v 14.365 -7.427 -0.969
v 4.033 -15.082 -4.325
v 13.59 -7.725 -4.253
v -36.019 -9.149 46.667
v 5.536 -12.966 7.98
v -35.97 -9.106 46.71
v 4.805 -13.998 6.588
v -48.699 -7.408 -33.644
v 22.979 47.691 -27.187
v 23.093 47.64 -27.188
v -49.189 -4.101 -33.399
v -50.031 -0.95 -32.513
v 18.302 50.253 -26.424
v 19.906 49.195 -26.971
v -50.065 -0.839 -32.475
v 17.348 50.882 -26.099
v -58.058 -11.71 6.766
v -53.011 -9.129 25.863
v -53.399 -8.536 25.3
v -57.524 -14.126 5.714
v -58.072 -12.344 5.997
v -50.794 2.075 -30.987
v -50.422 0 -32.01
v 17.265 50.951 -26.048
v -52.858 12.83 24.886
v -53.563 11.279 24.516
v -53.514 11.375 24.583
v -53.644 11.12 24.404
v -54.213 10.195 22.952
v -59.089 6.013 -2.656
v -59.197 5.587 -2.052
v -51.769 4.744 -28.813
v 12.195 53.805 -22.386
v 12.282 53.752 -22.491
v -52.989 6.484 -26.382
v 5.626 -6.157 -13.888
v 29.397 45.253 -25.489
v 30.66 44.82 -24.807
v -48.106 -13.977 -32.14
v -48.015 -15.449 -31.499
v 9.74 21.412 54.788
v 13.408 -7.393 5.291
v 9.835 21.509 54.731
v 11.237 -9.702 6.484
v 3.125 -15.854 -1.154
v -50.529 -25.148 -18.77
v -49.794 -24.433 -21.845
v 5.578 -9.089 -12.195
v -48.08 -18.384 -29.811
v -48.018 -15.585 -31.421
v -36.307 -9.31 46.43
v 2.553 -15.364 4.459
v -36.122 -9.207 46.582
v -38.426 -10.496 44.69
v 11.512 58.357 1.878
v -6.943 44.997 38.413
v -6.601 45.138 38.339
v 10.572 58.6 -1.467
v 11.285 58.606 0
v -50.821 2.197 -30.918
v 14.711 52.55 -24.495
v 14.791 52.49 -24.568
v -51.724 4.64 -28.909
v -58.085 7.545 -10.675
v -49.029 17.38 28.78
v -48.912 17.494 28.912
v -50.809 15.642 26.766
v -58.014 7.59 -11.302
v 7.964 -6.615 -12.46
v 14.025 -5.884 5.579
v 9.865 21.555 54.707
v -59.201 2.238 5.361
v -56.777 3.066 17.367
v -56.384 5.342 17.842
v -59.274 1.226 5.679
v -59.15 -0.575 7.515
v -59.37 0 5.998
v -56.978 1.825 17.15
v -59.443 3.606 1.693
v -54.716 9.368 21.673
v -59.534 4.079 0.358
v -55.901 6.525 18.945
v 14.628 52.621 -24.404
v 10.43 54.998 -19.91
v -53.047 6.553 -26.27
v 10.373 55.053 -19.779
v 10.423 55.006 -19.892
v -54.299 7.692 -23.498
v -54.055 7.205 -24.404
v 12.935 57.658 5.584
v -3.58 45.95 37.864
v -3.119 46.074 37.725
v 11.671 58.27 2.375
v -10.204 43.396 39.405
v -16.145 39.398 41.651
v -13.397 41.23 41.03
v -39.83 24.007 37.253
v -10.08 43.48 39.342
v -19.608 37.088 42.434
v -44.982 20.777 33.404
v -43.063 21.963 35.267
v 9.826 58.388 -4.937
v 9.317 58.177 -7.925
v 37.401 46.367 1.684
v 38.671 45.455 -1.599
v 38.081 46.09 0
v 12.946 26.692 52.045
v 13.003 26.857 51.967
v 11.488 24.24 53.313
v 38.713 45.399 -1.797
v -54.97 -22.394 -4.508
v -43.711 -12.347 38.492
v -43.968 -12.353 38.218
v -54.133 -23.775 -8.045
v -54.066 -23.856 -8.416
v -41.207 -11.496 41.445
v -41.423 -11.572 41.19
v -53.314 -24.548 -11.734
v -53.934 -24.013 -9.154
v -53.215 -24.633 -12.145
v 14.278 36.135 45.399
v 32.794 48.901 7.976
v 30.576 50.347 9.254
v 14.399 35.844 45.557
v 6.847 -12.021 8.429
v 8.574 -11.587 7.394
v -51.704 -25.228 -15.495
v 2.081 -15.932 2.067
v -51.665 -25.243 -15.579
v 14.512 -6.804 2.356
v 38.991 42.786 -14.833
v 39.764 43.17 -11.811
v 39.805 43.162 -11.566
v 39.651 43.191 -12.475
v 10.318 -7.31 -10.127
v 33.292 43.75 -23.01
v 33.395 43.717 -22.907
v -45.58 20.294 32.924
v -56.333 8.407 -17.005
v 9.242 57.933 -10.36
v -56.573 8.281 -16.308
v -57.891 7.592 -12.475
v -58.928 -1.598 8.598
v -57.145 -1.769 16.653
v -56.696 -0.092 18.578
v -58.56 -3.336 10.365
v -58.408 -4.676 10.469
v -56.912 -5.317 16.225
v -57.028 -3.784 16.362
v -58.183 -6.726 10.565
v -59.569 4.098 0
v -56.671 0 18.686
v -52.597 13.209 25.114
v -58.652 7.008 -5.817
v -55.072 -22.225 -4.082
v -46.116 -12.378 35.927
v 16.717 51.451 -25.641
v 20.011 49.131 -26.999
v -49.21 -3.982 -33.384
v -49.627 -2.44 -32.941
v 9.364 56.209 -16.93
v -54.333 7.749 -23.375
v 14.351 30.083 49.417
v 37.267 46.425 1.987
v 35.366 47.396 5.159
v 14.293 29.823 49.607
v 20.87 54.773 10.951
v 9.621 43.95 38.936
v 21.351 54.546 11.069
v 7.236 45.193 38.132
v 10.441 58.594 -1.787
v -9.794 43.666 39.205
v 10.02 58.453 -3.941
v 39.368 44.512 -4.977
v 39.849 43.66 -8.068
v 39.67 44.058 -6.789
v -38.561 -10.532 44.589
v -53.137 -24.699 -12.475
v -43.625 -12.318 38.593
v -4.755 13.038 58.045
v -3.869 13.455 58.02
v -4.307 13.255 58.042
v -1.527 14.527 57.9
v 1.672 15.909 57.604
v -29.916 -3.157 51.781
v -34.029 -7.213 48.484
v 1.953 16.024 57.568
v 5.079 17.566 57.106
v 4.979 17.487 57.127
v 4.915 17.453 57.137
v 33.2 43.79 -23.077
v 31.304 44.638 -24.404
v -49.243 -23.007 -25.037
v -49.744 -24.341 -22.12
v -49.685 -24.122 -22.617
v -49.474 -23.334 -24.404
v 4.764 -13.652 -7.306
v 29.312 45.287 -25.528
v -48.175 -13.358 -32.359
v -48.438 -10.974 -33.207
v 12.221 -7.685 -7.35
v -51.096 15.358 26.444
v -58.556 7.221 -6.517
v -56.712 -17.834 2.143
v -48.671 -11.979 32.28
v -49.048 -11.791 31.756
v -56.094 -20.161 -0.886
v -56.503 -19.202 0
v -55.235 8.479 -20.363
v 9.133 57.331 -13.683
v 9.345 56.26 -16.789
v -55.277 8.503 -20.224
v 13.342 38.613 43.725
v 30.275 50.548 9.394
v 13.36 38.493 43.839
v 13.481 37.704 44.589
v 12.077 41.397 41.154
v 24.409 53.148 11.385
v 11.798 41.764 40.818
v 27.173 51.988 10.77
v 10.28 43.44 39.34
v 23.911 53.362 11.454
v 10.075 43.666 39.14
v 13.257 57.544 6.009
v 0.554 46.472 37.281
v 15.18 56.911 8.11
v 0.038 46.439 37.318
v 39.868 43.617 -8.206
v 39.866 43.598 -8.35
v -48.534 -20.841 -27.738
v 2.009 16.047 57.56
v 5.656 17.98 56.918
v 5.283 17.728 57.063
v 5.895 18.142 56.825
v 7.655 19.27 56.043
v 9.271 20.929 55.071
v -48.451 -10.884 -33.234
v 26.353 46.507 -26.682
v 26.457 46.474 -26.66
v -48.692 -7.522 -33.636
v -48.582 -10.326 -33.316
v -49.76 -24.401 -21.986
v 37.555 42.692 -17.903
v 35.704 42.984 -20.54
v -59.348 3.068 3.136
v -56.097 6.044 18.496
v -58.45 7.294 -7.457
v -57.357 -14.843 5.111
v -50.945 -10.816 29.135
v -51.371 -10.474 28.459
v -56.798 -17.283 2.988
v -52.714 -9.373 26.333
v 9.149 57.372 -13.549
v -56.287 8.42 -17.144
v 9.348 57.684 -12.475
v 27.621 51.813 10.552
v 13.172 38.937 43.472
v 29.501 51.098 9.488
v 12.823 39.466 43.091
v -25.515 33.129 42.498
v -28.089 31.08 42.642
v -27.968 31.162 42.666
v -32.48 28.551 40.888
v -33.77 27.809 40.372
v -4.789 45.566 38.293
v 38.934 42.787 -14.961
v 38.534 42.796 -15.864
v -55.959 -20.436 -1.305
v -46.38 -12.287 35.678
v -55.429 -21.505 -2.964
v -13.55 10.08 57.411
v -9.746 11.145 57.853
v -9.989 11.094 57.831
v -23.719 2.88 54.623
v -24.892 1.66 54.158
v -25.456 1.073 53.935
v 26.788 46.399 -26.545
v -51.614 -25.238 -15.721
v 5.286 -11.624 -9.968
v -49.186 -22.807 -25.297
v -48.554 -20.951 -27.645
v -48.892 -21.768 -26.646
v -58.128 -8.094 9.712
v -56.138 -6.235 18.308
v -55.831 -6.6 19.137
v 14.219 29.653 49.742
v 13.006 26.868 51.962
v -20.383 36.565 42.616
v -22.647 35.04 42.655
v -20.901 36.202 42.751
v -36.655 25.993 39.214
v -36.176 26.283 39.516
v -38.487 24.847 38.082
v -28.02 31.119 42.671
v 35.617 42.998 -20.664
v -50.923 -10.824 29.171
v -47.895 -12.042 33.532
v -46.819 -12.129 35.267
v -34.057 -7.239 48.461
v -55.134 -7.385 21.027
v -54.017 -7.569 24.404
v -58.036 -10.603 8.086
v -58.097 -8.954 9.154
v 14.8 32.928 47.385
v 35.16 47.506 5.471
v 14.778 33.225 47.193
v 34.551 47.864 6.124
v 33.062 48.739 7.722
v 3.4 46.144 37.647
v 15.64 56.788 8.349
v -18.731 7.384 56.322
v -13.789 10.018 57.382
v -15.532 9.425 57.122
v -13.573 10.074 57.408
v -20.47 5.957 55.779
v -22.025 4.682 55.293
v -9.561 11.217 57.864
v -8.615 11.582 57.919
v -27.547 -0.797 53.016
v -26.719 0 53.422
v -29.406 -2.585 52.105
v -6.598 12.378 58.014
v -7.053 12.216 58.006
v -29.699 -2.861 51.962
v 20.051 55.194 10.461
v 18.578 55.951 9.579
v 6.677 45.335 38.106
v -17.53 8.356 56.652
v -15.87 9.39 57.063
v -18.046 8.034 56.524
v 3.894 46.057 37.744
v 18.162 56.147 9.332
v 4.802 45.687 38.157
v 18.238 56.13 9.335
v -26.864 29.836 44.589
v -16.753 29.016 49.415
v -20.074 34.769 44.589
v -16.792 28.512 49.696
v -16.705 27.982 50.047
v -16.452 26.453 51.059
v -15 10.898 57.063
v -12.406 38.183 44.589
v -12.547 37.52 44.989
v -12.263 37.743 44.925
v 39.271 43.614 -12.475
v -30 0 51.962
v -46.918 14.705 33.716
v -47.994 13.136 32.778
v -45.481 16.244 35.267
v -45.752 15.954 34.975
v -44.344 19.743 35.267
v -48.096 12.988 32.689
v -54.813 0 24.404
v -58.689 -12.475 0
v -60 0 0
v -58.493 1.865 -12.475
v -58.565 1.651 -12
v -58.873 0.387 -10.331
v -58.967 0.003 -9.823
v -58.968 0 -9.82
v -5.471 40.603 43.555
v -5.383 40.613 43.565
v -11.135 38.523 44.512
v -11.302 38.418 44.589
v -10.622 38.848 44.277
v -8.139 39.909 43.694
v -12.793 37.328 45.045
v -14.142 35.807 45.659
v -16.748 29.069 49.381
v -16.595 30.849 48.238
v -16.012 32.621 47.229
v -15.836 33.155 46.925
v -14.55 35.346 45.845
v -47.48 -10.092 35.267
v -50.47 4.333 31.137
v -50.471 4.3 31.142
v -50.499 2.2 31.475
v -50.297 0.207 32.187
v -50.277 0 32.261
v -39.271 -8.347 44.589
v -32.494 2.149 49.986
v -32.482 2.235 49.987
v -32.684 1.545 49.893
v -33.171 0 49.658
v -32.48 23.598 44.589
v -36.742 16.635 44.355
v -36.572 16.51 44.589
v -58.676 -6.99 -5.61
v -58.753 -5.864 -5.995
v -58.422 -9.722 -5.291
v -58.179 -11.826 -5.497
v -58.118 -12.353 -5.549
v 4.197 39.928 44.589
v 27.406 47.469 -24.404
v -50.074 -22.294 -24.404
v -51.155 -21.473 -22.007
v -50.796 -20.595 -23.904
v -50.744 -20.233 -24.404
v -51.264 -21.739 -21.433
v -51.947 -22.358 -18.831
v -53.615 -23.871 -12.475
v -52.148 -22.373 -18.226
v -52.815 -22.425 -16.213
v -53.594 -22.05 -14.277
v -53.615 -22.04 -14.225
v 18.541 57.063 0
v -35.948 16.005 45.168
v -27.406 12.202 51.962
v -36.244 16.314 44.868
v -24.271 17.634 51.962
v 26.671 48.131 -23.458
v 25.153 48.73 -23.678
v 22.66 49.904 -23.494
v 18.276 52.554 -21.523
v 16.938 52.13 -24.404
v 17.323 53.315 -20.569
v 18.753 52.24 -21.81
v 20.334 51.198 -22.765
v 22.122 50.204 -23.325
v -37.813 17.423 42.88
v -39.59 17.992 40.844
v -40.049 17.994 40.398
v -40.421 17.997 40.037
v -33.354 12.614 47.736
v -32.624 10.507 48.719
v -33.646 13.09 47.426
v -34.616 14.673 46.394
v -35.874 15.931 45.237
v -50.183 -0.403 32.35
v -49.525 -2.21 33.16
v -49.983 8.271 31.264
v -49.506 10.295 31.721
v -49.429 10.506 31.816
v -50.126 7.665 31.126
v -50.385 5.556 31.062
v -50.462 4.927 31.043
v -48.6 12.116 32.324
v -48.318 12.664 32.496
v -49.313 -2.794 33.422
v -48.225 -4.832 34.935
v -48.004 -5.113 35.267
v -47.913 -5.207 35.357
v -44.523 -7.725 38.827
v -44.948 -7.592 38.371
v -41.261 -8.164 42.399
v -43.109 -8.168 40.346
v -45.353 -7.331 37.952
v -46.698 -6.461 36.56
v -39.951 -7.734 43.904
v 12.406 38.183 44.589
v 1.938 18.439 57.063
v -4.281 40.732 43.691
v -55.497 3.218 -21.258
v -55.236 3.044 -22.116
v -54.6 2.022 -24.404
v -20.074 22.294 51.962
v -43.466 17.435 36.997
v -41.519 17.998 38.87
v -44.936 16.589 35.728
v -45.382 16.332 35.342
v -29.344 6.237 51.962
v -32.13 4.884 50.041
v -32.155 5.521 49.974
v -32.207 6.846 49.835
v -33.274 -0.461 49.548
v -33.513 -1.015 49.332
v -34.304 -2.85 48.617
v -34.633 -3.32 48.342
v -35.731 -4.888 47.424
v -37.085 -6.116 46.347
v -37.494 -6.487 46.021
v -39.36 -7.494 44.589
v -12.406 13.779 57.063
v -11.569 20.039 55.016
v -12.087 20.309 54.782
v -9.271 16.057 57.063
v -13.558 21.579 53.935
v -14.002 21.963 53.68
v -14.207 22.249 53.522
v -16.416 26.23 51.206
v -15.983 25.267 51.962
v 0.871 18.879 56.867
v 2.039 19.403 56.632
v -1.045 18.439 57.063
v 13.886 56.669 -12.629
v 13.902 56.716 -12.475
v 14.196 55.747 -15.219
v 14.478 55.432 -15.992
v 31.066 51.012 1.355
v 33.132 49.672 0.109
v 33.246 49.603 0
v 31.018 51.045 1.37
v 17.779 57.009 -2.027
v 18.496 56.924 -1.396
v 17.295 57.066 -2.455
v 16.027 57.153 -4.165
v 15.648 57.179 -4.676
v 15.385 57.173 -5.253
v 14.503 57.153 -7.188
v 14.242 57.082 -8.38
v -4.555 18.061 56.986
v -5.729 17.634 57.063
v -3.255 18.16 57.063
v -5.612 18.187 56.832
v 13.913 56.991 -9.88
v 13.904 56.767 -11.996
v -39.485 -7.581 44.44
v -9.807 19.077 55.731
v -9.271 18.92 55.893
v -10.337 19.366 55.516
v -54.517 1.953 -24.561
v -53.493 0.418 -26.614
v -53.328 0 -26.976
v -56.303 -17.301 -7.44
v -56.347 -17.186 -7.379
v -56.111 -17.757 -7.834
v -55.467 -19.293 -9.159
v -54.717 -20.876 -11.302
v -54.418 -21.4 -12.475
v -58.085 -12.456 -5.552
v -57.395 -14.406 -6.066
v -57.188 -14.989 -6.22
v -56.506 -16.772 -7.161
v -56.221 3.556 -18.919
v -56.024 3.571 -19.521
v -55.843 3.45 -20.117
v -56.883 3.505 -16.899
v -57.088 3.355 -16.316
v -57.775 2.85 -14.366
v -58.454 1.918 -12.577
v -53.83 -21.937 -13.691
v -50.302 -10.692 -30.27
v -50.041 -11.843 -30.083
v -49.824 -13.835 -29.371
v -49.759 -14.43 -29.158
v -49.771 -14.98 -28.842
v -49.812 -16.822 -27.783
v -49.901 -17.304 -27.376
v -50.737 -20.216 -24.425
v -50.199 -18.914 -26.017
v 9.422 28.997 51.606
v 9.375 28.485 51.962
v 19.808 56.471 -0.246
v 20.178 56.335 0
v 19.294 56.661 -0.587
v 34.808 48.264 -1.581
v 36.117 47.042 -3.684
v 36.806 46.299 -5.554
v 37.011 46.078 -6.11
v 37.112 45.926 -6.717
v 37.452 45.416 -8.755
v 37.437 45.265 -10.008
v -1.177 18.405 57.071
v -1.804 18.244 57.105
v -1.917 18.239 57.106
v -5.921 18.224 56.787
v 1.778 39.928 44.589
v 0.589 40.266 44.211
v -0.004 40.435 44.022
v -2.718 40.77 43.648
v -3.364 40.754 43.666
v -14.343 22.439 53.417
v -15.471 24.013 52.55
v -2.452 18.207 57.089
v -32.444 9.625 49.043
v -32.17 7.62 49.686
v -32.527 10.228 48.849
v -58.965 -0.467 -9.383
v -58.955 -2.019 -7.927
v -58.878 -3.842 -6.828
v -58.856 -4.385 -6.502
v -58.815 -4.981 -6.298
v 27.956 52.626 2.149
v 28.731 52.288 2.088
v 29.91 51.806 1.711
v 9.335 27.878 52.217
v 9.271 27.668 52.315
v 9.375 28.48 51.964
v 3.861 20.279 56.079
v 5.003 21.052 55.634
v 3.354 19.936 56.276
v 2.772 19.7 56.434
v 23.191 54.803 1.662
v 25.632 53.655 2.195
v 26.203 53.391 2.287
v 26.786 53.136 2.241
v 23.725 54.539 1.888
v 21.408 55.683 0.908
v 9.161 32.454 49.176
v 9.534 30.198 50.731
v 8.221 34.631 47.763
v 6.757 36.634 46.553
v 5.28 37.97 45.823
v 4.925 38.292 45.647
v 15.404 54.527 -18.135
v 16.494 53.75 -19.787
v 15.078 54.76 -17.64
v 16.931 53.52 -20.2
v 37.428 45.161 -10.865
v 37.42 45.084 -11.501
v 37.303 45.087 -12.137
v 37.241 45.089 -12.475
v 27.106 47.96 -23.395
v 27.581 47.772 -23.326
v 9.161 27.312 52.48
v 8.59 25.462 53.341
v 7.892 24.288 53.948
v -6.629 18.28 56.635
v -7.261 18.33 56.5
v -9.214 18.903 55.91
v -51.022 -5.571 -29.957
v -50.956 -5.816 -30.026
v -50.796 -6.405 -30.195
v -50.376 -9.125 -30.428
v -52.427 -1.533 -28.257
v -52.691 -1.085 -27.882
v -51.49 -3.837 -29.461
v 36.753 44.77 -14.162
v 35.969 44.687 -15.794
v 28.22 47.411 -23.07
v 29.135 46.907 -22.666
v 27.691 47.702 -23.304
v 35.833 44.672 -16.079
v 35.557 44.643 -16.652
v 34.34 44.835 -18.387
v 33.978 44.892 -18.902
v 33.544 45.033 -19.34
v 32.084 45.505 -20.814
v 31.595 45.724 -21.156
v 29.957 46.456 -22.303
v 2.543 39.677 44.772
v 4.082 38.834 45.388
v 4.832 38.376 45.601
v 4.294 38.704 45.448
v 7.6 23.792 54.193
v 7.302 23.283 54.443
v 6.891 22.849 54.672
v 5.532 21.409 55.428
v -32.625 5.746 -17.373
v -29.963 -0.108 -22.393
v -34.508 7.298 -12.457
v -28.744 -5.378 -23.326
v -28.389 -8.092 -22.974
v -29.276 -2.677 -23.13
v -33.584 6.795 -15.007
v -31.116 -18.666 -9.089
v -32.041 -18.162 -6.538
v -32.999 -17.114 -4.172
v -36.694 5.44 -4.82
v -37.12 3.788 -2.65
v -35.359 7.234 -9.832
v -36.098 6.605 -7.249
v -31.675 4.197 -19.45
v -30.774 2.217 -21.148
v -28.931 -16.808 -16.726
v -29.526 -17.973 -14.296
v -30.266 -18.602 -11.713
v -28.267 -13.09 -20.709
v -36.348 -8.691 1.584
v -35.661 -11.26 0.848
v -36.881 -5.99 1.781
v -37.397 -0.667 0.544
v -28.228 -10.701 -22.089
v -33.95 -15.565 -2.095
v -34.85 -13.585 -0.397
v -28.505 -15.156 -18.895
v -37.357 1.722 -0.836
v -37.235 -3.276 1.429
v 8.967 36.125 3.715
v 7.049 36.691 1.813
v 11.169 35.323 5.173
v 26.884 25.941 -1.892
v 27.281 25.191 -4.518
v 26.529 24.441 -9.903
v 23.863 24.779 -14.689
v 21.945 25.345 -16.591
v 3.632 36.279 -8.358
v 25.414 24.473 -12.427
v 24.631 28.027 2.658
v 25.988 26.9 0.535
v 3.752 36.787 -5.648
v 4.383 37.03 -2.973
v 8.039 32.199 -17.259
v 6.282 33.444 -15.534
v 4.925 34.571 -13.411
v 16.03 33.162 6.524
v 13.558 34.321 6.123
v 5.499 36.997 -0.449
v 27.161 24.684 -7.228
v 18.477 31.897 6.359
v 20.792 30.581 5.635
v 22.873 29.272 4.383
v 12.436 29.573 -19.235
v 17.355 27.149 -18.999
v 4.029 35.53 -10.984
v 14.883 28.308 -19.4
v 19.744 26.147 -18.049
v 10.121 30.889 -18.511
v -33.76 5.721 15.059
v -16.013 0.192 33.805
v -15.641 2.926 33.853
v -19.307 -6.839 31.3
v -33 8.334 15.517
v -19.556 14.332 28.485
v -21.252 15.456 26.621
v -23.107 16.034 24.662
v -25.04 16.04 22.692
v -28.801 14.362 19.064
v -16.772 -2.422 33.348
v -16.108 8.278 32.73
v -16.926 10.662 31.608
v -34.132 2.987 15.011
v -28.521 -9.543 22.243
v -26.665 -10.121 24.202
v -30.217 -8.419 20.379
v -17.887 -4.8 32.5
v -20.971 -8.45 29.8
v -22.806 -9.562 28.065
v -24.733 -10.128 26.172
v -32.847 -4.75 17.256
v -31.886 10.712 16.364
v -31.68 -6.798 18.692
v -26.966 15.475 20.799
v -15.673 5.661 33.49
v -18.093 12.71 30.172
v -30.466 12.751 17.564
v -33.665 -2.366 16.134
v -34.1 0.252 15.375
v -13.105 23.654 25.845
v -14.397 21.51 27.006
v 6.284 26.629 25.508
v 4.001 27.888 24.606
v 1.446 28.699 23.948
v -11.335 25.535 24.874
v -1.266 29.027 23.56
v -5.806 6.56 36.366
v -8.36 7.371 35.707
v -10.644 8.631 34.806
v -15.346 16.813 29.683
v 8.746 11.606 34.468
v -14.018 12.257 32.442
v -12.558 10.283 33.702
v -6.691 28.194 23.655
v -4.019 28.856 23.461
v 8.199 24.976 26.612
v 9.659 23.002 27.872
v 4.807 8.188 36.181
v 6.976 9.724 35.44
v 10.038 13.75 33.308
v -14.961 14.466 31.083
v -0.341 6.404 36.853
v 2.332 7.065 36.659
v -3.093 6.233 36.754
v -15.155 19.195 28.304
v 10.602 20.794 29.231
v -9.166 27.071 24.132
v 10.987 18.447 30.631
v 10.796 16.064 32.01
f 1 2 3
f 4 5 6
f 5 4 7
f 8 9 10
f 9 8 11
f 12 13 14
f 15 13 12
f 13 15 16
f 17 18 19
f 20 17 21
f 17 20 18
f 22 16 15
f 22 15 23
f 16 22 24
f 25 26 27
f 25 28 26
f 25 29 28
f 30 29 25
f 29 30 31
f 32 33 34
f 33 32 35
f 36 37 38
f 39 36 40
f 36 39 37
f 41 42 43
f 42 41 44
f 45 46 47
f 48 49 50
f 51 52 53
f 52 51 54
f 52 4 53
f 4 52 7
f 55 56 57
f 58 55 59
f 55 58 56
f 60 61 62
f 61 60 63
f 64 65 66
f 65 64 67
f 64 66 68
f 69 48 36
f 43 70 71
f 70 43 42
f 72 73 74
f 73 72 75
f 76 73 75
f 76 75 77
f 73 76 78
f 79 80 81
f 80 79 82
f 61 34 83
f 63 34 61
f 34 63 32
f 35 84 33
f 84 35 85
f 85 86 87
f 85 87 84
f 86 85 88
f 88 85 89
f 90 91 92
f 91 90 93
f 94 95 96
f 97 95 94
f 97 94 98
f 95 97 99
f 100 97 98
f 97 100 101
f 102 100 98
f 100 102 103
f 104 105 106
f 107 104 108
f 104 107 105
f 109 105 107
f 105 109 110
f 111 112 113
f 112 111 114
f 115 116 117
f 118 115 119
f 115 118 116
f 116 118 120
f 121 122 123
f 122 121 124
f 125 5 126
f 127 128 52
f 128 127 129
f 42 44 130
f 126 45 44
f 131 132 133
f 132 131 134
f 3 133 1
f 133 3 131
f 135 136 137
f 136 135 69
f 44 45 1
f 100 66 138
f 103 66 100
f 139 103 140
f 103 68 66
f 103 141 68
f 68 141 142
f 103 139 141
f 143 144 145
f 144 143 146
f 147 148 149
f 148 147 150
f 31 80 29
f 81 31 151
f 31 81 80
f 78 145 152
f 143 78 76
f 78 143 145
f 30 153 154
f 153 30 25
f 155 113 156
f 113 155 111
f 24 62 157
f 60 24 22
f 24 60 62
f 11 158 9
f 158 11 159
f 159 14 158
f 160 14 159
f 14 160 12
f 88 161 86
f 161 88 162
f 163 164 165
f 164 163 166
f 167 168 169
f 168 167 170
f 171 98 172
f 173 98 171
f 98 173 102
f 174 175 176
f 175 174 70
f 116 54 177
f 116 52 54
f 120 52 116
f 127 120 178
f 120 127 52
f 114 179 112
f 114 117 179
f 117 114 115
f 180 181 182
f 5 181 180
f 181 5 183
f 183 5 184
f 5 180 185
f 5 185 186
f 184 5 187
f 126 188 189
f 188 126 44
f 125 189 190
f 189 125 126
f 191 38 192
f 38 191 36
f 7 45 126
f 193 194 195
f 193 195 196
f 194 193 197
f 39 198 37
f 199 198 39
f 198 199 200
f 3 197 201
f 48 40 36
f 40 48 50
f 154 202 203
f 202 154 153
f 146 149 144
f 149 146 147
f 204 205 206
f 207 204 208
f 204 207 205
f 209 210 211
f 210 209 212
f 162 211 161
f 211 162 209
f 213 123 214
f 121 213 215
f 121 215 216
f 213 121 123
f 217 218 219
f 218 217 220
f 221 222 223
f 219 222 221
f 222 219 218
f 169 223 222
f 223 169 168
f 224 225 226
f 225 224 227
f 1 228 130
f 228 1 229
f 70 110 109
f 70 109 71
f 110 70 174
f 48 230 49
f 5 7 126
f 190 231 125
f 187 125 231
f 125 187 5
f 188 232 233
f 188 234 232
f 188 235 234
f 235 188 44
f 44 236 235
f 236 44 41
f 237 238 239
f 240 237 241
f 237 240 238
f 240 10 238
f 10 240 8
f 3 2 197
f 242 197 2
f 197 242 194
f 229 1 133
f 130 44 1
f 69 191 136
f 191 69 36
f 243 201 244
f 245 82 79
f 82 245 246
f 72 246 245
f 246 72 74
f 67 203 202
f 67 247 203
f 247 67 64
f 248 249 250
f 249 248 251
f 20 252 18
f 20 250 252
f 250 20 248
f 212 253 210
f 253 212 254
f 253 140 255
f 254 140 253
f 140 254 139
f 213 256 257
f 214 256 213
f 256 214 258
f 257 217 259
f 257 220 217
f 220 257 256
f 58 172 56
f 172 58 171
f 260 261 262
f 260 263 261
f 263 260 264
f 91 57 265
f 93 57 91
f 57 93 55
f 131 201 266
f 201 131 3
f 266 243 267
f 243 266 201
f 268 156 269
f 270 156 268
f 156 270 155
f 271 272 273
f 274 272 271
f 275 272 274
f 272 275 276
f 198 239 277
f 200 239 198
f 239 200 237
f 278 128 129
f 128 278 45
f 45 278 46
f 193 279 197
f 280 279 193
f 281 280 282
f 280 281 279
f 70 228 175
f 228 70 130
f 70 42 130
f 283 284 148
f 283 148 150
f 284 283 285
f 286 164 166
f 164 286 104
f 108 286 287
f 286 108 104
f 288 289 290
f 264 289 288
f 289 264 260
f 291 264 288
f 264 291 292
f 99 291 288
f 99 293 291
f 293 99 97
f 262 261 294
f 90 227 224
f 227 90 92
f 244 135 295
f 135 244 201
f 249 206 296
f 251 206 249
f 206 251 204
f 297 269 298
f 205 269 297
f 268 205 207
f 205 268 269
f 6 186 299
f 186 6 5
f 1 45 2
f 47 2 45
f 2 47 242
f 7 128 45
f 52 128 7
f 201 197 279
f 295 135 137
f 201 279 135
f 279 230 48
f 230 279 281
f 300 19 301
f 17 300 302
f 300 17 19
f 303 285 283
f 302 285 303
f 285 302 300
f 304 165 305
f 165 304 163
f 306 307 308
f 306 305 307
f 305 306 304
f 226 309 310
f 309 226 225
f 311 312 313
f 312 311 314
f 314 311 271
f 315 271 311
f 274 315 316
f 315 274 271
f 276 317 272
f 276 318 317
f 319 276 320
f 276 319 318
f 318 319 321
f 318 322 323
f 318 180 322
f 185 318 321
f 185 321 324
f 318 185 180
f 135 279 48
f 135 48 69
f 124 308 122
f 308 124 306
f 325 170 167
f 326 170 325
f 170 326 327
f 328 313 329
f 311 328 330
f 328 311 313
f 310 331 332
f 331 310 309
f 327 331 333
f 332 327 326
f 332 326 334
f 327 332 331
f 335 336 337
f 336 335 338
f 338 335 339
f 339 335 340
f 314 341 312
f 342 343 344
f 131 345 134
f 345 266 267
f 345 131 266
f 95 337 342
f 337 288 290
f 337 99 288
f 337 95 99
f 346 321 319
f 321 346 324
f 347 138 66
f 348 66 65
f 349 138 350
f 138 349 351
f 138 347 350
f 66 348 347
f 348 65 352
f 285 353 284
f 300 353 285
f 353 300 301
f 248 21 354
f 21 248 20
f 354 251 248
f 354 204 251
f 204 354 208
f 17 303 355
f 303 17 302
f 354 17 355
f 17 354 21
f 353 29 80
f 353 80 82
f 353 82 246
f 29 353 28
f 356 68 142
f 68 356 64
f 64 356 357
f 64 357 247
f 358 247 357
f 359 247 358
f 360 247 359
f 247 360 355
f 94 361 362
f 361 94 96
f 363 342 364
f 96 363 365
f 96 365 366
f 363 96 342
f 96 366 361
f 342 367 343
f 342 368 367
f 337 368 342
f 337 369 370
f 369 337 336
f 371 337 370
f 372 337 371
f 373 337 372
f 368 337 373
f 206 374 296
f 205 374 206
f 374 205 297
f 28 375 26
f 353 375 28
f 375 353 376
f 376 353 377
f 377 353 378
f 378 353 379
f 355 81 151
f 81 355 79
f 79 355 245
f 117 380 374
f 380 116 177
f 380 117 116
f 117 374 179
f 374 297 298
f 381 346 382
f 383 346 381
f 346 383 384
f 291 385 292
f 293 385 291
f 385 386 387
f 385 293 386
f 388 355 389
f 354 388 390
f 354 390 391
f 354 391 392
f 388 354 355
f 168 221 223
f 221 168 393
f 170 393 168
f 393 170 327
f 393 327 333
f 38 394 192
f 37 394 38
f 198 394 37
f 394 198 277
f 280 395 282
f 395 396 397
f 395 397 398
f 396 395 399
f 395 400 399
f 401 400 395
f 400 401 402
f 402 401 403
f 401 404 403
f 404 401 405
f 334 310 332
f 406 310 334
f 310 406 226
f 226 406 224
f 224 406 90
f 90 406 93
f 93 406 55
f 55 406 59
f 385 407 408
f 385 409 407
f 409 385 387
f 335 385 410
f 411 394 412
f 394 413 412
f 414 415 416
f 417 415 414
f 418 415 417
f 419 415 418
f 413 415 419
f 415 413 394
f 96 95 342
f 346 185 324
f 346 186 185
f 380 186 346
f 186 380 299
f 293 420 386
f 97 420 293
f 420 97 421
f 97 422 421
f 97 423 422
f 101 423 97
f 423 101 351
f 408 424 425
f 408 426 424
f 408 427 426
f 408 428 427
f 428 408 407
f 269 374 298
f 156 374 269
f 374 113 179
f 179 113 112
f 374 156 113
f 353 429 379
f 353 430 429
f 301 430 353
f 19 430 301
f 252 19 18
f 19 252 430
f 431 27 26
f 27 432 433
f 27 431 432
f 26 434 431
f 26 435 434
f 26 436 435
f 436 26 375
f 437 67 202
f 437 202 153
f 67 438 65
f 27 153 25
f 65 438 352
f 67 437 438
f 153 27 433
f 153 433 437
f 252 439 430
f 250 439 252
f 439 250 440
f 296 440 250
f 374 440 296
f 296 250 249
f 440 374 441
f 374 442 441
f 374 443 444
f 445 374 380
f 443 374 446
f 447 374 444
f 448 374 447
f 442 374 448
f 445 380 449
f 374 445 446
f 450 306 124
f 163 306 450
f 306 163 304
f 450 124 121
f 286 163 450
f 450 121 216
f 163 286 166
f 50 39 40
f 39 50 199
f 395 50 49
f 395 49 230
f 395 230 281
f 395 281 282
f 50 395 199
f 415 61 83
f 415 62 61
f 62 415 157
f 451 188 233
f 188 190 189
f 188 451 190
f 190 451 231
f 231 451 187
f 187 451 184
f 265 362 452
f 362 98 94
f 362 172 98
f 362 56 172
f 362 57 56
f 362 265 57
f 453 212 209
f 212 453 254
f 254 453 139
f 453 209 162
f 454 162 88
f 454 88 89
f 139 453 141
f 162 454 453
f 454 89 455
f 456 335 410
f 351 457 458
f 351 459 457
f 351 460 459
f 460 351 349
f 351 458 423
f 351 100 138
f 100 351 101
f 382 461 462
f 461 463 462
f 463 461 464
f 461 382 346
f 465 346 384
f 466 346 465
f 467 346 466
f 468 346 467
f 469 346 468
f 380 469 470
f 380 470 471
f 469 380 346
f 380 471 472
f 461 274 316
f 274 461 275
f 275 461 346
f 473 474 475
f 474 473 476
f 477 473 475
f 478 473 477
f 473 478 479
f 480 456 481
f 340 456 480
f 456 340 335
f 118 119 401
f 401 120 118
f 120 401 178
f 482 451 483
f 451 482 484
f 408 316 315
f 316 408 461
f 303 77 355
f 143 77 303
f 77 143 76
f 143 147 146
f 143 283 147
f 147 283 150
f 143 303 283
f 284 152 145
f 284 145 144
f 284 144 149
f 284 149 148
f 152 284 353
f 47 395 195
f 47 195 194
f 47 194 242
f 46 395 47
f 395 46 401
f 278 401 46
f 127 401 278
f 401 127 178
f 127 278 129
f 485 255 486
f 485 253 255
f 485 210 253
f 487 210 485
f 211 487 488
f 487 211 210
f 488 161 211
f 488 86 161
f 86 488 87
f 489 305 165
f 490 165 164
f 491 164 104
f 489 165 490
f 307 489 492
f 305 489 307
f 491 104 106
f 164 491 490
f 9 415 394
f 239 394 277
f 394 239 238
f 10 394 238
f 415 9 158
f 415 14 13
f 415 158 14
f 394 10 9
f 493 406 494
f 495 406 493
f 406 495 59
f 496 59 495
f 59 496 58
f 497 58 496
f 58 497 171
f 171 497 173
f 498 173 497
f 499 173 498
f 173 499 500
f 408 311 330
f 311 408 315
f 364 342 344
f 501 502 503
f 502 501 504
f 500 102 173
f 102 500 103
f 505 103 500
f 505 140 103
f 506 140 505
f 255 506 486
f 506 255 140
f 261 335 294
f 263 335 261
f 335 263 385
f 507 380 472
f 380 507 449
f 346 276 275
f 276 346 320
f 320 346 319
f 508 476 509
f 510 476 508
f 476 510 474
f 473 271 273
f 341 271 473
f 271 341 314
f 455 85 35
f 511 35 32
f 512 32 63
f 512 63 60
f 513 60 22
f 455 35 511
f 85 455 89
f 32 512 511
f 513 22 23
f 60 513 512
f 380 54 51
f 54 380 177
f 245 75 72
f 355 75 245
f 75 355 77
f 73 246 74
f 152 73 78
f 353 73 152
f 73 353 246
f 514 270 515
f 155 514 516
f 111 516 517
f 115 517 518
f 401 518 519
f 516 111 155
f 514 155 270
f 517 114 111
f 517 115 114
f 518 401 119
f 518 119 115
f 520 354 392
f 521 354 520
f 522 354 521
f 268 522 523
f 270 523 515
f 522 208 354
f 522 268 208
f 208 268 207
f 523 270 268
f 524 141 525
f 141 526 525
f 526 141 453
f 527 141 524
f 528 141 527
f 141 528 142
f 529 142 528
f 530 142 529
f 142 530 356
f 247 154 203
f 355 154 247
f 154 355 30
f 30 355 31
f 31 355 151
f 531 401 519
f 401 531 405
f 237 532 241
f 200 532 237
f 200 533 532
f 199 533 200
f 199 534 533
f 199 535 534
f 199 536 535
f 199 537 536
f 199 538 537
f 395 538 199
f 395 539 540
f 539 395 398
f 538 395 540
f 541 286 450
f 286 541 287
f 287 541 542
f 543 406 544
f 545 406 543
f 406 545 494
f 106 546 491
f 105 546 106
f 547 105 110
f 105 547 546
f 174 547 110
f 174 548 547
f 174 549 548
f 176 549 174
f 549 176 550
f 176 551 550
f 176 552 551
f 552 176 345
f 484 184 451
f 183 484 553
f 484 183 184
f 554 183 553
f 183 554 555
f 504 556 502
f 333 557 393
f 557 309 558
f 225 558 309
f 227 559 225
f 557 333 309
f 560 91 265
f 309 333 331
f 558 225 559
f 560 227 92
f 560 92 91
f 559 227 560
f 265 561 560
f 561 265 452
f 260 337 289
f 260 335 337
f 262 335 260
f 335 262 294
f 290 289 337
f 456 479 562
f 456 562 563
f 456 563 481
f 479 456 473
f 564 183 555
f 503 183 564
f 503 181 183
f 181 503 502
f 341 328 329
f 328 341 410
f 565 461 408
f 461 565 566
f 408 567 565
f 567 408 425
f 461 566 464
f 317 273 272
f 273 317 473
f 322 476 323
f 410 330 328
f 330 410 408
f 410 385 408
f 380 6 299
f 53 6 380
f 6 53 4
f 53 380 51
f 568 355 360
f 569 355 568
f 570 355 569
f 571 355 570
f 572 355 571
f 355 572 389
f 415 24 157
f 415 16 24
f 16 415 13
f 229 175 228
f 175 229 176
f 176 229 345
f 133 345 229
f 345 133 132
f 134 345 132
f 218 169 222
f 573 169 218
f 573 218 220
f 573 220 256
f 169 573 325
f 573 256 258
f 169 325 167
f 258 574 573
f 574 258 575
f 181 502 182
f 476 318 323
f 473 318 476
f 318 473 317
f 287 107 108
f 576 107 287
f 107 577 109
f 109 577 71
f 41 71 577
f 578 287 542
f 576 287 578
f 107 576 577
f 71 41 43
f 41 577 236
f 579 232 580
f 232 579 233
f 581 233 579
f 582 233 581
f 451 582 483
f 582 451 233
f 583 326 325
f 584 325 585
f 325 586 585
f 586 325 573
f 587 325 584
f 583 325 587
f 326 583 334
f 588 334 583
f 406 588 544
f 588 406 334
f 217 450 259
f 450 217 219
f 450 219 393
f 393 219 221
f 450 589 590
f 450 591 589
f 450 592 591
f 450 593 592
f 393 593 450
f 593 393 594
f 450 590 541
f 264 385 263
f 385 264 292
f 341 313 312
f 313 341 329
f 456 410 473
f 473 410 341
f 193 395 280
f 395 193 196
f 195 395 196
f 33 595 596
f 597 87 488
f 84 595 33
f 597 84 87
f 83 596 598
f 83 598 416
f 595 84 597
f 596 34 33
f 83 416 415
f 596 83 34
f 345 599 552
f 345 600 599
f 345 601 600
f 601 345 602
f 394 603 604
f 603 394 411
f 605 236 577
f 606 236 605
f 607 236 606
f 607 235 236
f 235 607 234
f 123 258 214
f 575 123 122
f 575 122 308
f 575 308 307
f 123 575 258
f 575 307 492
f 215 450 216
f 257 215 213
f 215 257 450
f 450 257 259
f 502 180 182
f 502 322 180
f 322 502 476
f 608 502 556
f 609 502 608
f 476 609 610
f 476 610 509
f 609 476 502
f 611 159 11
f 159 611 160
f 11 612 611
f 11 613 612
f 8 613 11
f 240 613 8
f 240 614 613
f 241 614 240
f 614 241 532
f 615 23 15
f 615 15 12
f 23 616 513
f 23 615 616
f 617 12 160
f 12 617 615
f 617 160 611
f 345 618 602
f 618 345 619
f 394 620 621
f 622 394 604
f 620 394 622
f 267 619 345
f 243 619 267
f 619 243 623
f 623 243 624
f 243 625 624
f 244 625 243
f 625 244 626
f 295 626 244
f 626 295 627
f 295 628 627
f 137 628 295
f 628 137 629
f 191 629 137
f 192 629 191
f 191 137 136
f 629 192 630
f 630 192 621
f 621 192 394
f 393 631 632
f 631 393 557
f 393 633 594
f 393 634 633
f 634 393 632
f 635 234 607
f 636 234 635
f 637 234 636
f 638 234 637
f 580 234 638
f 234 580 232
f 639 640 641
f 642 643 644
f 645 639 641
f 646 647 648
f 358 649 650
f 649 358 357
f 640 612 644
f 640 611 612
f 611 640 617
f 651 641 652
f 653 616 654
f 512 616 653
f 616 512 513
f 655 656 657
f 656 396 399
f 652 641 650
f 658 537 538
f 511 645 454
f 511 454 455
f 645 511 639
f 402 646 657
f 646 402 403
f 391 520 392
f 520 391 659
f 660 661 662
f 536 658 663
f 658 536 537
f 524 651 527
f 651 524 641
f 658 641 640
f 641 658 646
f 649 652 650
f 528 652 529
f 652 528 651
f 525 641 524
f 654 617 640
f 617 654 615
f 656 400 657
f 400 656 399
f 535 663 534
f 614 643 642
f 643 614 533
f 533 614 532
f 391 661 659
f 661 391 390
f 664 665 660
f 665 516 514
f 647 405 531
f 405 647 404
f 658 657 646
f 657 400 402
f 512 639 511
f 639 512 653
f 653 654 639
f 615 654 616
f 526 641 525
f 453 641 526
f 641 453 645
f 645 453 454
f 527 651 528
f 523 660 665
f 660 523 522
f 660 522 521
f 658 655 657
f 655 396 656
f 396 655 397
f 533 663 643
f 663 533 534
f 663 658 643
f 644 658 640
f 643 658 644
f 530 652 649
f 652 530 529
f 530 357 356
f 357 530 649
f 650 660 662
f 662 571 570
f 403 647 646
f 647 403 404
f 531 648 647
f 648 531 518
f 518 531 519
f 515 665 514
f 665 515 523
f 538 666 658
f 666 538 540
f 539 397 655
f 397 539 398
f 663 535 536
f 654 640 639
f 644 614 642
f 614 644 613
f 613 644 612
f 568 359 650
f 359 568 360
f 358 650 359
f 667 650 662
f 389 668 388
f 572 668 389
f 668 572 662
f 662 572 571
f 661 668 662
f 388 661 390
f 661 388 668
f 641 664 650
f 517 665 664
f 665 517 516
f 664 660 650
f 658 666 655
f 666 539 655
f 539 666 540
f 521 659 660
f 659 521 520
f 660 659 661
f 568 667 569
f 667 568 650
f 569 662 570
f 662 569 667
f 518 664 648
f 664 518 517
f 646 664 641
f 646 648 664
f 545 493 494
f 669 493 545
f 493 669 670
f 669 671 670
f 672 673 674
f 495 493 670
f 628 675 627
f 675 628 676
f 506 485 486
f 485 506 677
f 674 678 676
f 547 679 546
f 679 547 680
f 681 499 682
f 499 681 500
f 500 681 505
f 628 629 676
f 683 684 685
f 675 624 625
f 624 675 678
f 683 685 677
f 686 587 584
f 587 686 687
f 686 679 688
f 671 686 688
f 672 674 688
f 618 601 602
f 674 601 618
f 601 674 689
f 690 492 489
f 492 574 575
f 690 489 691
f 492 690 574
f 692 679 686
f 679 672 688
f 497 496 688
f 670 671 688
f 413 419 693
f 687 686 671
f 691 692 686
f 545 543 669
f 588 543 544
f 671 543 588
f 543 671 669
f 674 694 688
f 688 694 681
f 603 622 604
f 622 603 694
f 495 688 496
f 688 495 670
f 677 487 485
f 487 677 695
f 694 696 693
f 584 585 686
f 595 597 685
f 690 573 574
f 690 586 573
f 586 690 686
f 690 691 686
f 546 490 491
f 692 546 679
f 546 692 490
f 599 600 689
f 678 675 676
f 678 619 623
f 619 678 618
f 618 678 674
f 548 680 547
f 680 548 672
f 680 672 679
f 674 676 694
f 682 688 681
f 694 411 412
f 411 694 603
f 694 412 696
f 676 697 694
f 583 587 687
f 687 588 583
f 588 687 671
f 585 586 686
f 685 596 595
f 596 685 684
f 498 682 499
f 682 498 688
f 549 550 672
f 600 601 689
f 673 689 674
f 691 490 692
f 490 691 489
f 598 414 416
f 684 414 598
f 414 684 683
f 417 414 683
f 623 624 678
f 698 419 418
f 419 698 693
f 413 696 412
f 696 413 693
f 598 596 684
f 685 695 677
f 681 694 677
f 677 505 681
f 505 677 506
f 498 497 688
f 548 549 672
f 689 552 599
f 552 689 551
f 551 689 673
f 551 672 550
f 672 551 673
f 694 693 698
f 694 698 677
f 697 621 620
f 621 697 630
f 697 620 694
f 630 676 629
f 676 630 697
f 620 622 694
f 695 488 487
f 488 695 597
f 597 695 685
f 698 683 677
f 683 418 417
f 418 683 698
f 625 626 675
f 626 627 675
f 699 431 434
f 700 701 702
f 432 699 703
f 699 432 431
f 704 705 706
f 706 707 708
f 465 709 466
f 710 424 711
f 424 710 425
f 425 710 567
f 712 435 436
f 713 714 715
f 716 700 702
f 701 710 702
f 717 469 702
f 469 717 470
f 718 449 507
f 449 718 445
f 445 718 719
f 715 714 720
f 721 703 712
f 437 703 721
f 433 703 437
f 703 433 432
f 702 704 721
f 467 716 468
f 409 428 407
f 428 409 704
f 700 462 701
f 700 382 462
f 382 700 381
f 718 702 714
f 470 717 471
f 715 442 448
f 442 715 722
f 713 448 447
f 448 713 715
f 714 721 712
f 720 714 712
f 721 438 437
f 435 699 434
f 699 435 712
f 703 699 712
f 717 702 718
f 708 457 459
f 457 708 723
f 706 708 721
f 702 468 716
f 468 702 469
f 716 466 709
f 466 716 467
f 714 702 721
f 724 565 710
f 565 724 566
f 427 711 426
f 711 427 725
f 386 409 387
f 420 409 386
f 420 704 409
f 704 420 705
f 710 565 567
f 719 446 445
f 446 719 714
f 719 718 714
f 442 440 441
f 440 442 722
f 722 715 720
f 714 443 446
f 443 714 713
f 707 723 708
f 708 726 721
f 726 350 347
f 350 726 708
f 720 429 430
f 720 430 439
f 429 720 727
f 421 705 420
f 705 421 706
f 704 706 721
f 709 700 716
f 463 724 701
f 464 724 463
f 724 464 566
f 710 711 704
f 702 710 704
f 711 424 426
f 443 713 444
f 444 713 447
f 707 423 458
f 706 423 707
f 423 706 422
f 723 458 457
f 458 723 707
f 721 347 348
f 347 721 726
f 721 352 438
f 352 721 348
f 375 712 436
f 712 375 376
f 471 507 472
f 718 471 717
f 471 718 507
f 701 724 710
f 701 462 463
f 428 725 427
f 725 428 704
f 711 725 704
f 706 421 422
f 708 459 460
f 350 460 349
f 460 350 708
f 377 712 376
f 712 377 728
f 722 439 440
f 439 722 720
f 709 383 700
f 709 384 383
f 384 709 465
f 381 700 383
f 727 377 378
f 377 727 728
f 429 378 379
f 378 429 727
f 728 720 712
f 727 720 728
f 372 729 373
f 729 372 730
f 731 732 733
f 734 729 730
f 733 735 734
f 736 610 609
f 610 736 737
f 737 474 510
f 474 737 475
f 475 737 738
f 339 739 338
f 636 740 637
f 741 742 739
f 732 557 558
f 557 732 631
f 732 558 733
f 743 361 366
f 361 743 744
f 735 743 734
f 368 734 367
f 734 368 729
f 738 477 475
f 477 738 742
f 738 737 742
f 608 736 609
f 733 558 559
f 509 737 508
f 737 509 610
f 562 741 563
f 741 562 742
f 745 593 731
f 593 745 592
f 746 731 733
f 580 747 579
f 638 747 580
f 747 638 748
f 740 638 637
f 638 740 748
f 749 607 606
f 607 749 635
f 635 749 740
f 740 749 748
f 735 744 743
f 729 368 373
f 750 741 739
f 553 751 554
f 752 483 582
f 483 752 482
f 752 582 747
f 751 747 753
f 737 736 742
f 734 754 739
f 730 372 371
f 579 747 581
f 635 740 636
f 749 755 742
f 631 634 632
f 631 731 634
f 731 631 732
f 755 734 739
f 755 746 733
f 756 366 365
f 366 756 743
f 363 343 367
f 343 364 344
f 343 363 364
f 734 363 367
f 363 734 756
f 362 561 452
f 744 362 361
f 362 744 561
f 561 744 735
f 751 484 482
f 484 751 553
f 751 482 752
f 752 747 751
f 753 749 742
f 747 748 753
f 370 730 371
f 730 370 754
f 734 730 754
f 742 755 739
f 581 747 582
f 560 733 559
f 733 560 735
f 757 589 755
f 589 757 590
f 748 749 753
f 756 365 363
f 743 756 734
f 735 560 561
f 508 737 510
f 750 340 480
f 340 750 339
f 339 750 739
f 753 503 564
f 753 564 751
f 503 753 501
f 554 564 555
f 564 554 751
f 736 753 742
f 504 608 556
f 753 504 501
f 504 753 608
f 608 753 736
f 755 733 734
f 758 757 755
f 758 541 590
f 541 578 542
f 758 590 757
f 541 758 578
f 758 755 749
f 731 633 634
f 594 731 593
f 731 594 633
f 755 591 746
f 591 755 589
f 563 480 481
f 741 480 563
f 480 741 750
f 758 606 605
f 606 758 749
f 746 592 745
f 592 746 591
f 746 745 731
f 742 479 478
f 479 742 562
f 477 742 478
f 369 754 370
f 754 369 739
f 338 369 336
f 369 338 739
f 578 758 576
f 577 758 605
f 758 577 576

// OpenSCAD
difference() {
	intersection() {
		hull() {
			rotate(a = -150.2044300830, v = [-0.3560759648, -0.3465924684, 0.0000000000]) {
				rotate(a = -90.0000000000, v = [-0.9914448614, 0.1305261922, 0.0000000000]) {
					cylinder(h = 60, r = 16.2000000000);
				}
			}
			rotate(a = -150.2044300830, v = [-0.3560759648, -0.3465924684, 0.0000000000]) {
				rotate(a = -90.0000000000, v = [0.3826834324, -0.9238795325, 0.0000000000]) {
					cylinder(h = 60, r = 16.2000000000);
				}
			}
			rotate(a = -150.2044300830, v = [-0.3560759648, -0.3465924684, 0.0000000000]) {
				rotate(a = -151.9205722594, v = [-0.4117825928, 0.2280109476, 0.0000000000]) {
					cylinder(h = 60, r = 16.2000000000);
				}
			}
			rotate(a = -150.2044300830, v = [-0.3560759648, -0.3465924684, 0.0000000000]) {
				rotate(a = -161.5616070448, v = [0.2692672153, -0.1659253944, 0.0000000000]) {
					cylinder(h = 60, r = 16.2000000000);
				}
			}
		}
		sphere(r = 60);
	}
	union() {
		rotate(a = -150.2044300830, v = [-0.3560759648, -0.3465924684, 0.0000000000]) {
			rotate(a = -90.0000000000, v = [-0.9914448614, 0.1305261922, 0.0000000000]) {
				translate(v = [0, 0, 35]) {
					cylinder(h = 100, r = 13.2000000000);
				}
			}
		}
		rotate(a = -150.2044300830, v = [-0.3560759648, -0.3465924684, 0.0000000000]) {
			rotate(a = -90.0000000000, v = [0.3826834324, -0.9238795325, 0.0000000000]) {
				translate(v = [0, 0, 35]) {
					cylinder(h = 100, r = 13.2000000000);
				}
			}
		}
		rotate(a = -150.2044300830, v = [-0.3560759648, -0.3465924684, 0.0000000000]) {
			rotate(a = -151.9205722594, v = [-0.4117825928, 0.2280109476, 0.0000000000]) {
				translate(v = [0, 0, 35]) {
					cylinder(h = 100, r = 13.2000000000);
				}
			}
		}
		rotate(a = -150.2044300830, v = [-0.3560759648, -0.3465924684, 0.0000000000]) {
			rotate(a = -161.5616070448, v = [0.2692672153, -0.1659253944, 0.0000000000]) {
				translate(v = [0, 0, 35]) {
					cylinder(h = 100, r = 13.2000000000);
				}
			}
		}
	}
}
